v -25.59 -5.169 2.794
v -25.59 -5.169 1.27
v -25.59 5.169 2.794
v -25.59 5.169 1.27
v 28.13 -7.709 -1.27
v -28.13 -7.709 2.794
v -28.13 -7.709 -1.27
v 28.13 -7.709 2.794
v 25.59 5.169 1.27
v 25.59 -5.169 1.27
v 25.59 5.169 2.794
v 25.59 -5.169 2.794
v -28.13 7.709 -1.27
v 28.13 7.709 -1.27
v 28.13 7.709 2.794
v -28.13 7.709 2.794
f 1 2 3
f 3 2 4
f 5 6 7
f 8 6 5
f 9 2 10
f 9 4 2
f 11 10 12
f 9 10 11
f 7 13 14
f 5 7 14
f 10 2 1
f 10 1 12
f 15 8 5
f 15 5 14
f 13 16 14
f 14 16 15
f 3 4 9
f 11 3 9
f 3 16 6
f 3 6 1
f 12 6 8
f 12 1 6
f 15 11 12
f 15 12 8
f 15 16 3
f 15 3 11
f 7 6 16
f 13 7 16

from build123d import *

# Parameters (mm, degrees)
F0_W     = 56.261
F0_H     = 15.4178
F0_W_2   = 51.181
F0_H_2   = 10.3378
F1_DEPTH = 1.27
F2_DEPTH = 2.794


# Not quite as in the source:
# - a feature names something its author has since deleted; it is built from what else it names


with BuildPart() as f1:
    # F0 (on Top) → F1 (new body, symmetric)
    with BuildSketch(Plane.XY):
        Rectangle(F0_W, F0_H)
        Rectangle(F0_W_2, F0_H_2, mode=Mode.SUBTRACT)
        Rectangle(F0_W_2, F0_H_2)
    extrude(amount=F1_DEPTH, both=True)

    # F0 (on Top) → F2 (join)
    with BuildSketch(Plane.XY):
        Rectangle(F0_W, F0_H)
        Rectangle(F0_W_2, F0_H_2, mode=Mode.SUBTRACT)
    extrude(amount=F2_DEPTH)


solid = f1.part
